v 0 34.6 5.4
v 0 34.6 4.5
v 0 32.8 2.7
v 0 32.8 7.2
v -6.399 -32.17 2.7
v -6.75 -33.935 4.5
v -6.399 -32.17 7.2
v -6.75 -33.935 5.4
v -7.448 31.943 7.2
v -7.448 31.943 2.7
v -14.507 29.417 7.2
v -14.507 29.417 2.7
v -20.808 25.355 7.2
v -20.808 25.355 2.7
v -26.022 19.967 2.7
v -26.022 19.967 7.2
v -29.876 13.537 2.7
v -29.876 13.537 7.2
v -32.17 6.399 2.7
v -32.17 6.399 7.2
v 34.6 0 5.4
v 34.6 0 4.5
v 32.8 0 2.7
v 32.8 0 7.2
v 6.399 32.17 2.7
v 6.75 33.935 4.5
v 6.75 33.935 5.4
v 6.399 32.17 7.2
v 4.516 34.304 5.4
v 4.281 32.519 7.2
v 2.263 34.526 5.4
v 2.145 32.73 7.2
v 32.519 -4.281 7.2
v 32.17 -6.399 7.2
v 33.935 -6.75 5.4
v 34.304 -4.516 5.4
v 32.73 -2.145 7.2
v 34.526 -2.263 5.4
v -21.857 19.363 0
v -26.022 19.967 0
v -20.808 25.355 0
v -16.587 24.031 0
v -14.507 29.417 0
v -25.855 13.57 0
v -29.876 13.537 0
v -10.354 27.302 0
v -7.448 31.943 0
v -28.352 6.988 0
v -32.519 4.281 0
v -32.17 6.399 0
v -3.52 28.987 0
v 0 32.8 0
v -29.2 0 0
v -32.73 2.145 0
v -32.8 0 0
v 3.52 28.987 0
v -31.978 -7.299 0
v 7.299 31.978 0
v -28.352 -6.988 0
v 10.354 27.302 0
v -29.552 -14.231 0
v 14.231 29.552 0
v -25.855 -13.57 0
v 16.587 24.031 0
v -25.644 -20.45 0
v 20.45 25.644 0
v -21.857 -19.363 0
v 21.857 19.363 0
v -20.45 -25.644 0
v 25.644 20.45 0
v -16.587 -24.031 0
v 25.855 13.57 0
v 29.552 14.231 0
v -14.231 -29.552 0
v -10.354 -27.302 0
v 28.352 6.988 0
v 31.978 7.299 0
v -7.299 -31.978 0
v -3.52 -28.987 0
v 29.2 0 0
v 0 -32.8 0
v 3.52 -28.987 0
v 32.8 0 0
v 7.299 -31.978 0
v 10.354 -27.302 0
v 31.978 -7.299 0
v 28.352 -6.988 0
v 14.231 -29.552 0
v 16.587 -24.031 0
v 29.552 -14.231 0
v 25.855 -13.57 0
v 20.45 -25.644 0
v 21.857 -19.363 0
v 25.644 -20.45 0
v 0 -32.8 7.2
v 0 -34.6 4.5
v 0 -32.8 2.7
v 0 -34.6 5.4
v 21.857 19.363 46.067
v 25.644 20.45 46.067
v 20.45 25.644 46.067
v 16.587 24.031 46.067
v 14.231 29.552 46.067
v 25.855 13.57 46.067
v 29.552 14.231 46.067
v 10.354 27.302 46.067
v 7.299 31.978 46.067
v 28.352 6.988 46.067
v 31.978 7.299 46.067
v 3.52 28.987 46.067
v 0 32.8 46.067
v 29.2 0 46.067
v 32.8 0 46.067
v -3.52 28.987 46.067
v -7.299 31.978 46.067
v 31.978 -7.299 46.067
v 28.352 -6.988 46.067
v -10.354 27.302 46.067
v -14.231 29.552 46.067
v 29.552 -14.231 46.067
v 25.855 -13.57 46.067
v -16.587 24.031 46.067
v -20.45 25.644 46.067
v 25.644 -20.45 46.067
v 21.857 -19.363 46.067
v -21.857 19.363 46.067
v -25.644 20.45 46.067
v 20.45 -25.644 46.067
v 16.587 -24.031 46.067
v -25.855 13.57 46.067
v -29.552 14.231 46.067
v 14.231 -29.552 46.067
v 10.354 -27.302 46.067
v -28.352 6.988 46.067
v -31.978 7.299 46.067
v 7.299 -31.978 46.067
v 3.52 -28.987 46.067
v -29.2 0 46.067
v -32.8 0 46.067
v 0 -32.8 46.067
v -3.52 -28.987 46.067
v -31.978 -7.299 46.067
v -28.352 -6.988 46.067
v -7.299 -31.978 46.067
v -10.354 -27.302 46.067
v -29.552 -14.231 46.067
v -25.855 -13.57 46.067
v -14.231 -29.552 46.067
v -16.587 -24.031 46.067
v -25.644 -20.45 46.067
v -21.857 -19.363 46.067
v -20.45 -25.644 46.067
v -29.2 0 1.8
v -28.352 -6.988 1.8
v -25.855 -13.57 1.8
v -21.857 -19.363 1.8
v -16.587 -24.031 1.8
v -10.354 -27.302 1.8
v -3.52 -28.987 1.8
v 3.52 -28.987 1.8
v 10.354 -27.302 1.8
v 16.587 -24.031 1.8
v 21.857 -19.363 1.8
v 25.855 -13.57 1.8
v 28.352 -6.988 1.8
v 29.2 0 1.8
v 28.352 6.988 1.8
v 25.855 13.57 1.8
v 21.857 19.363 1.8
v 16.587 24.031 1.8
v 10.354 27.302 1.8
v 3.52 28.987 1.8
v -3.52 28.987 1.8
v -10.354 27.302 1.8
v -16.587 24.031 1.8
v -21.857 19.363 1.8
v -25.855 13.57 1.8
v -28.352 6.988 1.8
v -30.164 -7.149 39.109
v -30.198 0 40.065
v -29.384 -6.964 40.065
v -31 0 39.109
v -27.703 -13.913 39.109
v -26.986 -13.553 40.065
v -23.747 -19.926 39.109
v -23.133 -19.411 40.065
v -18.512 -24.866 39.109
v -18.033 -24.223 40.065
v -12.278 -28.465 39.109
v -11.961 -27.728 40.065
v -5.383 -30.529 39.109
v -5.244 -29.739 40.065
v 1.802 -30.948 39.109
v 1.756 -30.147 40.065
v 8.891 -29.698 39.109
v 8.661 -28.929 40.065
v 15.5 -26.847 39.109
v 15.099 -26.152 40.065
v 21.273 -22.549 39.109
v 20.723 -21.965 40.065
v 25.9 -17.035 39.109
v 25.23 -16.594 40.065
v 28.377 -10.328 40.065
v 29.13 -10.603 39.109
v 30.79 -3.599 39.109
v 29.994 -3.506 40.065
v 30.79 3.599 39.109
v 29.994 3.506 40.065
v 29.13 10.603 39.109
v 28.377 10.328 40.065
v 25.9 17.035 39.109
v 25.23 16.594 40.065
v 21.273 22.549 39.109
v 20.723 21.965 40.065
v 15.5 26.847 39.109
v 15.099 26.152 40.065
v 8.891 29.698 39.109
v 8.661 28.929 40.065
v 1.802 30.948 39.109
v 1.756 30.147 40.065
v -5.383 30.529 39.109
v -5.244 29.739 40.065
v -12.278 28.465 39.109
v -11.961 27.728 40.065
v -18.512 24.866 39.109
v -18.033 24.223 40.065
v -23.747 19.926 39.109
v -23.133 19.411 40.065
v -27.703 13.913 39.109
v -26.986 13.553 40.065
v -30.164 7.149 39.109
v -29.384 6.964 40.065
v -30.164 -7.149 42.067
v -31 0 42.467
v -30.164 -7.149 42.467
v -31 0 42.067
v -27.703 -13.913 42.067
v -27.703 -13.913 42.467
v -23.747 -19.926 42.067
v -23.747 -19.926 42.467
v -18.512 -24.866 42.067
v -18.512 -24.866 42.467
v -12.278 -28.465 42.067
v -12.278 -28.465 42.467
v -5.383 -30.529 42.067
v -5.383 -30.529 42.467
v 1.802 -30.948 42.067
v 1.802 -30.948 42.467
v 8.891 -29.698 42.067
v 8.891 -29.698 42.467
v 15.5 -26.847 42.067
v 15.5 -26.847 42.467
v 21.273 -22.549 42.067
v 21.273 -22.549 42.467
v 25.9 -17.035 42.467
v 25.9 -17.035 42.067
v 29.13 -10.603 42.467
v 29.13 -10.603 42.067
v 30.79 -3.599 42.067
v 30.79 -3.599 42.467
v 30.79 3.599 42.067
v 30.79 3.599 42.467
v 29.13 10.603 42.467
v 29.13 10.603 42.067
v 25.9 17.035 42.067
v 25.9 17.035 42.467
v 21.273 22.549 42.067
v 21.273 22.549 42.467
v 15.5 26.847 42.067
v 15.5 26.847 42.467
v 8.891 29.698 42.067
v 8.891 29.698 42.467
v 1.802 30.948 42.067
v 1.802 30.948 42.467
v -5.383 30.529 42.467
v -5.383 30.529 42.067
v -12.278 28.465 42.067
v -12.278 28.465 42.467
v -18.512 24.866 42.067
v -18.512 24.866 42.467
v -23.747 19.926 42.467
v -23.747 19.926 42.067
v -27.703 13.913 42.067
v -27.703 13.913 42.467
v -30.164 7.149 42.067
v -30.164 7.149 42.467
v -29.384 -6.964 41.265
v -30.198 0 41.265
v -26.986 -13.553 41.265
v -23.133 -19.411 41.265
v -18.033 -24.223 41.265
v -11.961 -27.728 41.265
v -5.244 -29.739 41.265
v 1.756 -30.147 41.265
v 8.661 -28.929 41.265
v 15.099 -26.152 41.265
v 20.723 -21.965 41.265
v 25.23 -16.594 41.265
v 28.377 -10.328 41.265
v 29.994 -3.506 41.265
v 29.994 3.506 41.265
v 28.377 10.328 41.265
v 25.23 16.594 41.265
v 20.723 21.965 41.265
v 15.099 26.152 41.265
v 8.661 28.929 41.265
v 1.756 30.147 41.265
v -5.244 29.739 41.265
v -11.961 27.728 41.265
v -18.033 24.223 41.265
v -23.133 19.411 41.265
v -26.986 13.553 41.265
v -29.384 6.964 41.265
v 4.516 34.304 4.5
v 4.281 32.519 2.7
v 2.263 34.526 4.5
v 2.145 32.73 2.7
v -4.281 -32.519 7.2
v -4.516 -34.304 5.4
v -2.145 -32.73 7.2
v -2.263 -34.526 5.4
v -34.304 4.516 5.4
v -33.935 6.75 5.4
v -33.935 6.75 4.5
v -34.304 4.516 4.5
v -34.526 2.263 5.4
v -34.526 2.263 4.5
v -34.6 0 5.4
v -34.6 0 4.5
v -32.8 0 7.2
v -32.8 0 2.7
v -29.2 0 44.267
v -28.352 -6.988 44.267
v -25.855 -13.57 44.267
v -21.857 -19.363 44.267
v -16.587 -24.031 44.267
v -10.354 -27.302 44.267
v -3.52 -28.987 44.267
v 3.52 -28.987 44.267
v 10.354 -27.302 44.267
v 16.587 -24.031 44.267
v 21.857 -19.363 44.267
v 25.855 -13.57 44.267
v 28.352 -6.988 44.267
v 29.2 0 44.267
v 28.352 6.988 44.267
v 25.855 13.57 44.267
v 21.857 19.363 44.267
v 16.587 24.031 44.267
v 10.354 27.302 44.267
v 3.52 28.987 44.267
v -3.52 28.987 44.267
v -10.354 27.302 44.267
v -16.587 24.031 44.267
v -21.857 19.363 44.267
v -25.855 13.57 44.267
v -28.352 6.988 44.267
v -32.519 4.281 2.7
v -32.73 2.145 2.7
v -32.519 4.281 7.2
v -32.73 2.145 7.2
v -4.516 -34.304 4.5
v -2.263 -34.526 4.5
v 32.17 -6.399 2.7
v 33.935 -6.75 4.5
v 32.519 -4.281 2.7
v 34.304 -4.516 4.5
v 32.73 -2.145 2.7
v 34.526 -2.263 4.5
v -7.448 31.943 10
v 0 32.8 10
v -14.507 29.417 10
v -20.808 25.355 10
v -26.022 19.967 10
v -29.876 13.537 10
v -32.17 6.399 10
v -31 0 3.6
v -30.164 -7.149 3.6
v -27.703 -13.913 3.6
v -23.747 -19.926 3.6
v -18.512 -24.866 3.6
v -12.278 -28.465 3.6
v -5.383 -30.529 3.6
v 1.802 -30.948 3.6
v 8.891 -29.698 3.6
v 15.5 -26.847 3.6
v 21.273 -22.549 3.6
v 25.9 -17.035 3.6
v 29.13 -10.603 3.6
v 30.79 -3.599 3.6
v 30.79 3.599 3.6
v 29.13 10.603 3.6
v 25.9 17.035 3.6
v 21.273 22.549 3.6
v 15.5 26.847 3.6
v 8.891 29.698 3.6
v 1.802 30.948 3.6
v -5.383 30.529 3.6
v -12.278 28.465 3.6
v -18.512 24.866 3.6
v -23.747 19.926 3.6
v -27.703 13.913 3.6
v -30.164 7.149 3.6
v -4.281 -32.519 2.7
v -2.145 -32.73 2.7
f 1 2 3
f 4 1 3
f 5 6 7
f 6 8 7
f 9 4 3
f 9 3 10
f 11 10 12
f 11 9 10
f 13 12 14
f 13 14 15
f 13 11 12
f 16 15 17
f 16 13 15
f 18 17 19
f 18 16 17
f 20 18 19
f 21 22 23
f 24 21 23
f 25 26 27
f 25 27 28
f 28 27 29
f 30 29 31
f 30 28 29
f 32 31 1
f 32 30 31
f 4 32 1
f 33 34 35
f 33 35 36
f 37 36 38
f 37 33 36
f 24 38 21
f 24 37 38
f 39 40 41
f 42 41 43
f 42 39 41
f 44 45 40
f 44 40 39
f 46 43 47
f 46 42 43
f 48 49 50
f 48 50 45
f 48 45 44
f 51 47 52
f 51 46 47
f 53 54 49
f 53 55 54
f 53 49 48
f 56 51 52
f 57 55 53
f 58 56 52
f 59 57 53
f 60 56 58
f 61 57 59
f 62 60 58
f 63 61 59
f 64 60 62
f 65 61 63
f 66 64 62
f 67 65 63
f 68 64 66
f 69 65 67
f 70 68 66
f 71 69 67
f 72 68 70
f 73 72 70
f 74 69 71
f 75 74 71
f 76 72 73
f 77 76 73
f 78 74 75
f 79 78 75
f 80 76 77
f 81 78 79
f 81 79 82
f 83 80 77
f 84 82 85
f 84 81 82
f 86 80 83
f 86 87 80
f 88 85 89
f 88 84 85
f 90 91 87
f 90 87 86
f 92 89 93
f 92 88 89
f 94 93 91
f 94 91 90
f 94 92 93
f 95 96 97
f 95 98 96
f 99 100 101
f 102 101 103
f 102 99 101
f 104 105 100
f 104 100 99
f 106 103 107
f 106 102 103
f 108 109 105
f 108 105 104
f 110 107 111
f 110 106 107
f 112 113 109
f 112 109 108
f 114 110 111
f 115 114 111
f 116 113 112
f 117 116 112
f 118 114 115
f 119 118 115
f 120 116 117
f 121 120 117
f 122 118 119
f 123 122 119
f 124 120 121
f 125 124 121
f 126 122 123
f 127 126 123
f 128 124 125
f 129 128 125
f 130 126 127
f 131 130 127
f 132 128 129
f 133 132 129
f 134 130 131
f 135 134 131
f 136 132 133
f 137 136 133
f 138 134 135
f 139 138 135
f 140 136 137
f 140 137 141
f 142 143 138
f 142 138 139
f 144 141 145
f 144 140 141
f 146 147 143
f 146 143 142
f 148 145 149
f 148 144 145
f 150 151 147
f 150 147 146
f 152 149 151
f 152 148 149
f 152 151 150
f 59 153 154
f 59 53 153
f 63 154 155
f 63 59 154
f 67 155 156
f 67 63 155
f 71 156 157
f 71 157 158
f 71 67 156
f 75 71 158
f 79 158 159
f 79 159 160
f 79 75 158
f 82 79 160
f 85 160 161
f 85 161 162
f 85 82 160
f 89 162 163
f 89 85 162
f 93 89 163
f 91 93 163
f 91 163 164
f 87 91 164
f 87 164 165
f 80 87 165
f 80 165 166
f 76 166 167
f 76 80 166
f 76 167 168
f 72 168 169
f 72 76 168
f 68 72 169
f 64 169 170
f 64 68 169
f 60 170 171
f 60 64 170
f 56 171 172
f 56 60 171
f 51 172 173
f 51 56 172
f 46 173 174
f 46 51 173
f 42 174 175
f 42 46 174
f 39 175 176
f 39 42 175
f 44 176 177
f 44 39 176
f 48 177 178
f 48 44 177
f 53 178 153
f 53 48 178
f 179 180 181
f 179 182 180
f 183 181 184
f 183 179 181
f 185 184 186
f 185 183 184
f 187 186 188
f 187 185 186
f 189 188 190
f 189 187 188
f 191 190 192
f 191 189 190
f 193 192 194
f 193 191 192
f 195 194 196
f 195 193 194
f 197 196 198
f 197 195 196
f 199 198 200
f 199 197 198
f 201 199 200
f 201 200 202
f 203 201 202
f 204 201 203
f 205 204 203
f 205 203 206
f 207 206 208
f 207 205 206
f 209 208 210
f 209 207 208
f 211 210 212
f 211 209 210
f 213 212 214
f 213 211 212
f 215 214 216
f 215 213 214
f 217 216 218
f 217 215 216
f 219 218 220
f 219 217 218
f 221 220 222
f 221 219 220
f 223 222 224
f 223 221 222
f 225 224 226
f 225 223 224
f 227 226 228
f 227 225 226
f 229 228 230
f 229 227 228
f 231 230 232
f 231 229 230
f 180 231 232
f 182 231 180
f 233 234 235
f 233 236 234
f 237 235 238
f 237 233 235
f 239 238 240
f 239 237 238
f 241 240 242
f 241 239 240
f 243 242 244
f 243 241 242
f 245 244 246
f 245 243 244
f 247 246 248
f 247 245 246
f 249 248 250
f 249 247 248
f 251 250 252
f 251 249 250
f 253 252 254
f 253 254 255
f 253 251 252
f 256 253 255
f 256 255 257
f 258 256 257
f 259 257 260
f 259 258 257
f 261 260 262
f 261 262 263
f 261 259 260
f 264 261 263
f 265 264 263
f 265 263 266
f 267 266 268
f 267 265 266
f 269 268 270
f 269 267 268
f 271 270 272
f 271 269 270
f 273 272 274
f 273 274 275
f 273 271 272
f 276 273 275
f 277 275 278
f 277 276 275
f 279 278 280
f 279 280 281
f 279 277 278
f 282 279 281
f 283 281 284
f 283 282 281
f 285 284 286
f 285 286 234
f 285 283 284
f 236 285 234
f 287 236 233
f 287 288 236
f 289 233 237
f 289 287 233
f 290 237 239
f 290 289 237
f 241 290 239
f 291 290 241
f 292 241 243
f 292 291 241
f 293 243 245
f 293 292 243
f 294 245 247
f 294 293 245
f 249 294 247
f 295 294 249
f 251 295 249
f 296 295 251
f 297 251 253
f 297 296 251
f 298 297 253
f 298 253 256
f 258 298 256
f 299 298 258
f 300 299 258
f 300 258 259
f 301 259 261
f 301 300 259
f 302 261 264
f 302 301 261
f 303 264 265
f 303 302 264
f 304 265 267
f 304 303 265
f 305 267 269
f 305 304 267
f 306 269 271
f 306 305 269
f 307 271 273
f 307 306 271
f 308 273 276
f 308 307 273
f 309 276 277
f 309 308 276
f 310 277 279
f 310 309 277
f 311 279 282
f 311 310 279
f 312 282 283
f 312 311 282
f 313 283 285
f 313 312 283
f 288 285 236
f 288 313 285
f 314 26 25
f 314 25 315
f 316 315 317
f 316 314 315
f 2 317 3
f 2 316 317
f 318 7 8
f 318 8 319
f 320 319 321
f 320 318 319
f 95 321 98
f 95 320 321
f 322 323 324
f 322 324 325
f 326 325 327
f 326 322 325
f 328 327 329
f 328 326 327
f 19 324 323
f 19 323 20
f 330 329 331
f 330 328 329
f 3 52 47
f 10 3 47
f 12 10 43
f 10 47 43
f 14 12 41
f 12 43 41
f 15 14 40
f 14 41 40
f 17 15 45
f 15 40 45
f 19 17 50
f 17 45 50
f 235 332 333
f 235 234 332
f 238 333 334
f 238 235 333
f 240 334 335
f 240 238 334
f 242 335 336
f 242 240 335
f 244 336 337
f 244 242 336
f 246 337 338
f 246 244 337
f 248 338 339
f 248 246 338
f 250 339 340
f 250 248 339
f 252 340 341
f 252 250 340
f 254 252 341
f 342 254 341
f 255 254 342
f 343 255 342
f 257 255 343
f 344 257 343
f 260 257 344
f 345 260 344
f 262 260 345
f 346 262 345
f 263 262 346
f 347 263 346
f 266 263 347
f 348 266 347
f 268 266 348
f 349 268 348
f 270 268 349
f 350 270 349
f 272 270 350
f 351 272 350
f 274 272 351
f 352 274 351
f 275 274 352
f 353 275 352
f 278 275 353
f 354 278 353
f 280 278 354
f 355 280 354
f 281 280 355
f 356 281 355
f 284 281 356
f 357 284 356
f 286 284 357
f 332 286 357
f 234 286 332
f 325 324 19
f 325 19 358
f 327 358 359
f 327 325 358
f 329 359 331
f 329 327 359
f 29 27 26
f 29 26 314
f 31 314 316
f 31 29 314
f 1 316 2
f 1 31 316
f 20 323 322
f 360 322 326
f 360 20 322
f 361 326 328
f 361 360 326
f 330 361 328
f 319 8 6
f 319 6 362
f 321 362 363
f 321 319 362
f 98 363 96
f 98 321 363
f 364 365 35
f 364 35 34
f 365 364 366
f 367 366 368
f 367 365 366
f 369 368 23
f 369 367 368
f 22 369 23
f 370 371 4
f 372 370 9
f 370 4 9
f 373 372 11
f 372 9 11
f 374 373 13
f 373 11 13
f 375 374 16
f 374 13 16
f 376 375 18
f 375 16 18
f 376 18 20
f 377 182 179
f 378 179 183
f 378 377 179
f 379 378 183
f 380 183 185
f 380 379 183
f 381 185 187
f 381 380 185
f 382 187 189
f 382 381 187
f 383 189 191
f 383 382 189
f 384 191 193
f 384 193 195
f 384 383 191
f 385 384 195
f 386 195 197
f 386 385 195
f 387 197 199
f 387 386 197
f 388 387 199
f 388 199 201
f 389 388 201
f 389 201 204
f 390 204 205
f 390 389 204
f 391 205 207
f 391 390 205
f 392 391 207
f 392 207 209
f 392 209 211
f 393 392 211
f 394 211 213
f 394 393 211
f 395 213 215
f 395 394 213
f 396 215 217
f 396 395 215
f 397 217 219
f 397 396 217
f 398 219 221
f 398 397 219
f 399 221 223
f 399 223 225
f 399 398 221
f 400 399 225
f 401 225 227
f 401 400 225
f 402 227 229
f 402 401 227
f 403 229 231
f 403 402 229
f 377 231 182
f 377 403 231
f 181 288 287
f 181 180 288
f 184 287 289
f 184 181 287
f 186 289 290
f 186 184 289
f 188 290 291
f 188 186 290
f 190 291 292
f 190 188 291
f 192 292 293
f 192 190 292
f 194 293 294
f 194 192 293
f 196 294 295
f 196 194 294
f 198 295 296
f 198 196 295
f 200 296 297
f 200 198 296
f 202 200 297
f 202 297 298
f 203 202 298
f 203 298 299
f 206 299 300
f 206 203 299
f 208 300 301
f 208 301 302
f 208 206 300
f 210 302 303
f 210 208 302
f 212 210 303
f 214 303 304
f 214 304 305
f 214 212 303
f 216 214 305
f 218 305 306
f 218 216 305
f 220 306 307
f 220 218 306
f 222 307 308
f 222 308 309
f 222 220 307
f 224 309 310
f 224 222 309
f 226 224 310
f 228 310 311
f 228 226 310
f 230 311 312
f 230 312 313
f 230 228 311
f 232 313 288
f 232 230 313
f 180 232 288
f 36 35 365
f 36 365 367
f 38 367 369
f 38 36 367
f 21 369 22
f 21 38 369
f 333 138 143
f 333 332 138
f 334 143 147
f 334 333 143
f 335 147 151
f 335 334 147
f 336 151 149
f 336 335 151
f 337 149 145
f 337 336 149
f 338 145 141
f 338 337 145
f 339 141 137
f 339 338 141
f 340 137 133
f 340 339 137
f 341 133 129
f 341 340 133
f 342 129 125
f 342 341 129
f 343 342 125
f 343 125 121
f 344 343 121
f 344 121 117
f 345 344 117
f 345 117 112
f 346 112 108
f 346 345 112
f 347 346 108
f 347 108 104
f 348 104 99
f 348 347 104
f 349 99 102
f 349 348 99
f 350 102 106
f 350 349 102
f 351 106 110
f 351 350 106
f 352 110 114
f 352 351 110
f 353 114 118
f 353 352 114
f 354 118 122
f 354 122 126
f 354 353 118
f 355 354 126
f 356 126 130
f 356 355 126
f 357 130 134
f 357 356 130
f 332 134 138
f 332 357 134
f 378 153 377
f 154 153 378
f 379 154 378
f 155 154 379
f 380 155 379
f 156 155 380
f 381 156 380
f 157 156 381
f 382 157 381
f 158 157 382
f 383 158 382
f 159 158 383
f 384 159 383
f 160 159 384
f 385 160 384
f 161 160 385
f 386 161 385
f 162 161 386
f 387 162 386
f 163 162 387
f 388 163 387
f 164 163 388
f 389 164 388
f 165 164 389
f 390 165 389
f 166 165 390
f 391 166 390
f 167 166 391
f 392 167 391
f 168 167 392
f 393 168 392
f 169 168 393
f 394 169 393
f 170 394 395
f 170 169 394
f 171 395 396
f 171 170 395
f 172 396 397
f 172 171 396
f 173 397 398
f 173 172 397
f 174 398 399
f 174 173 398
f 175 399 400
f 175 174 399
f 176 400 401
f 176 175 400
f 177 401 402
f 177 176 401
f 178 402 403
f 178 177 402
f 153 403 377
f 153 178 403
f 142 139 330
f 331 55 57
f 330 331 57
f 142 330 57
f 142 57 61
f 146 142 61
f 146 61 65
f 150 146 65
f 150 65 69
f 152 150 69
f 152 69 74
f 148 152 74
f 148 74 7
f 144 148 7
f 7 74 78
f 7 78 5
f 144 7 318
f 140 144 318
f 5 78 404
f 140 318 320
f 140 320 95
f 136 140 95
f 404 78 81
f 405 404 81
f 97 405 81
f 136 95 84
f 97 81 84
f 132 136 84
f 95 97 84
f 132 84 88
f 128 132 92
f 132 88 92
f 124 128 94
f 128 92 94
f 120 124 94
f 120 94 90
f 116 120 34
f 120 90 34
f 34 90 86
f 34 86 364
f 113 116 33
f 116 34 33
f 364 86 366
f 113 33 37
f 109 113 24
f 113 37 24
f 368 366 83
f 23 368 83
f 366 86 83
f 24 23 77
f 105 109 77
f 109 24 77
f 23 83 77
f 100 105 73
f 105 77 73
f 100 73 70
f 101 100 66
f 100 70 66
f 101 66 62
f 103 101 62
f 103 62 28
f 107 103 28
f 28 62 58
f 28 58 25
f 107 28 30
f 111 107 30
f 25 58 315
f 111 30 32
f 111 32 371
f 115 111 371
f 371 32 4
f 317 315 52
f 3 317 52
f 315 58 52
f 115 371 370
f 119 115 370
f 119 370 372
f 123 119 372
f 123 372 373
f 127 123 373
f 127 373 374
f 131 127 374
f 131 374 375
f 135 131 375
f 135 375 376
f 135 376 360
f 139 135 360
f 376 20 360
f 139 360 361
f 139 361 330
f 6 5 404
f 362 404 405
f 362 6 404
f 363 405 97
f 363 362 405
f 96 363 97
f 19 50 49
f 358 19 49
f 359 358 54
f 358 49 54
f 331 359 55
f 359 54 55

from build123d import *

# Parameters (mm, degrees)
SKETCH003_W        = 2
SKETCH003_H        = 10
GROOVE_ANGLE       = 78.75
POLARPATTERN_COUNT = 4


with BuildPart() as part:
    # Sketch002 → Revolution002 (revolve)
    with BuildSketch(Plane.XZ):
        Polygon((-32.8, 46.066667), (-29.2, 46.066667), (-29.2, 44.266667), (-31, 42.466667), (-31, 42.066667), (-30.198, 41.264667), (-30.198, 40.064667), (-31, 39.10888), (-31, 3.6), (-29.2, 1.8), (-29.2, 0), (-32.8, 0), (-32.8, 2.7), (-34.6, 4.5), (-34.6, 5.4), (-32.8, 7.2), (-32.8, 44.266667), align=None)
    revolve(axis=Axis((0, 0, 0), (0, 0, 1)))

    # Sketch003 → Groove (revolve, cut)
    with BuildSketch(Plane.XZ):
        with Locations((-33.8, 5)):
            Rectangle(SKETCH003_W, SKETCH003_H)
    groove = revolve(axis=Axis((0, 0, 0), (0, 0, 1)), revolution_arc=GROOVE_ANGLE, mode=Mode.SUBTRACT)

    # PolarPattern: Groove ×4 about axis
    polarpattern_axis = Axis((0, 0, 0), (0, 0, 1))
    for i in range(1, POLARPATTERN_COUNT):
        add(groove.rotate(polarpattern_axis, i * 360 / POLARPATTERN_COUNT), mode=Mode.SUBTRACT)


solid = part.part
